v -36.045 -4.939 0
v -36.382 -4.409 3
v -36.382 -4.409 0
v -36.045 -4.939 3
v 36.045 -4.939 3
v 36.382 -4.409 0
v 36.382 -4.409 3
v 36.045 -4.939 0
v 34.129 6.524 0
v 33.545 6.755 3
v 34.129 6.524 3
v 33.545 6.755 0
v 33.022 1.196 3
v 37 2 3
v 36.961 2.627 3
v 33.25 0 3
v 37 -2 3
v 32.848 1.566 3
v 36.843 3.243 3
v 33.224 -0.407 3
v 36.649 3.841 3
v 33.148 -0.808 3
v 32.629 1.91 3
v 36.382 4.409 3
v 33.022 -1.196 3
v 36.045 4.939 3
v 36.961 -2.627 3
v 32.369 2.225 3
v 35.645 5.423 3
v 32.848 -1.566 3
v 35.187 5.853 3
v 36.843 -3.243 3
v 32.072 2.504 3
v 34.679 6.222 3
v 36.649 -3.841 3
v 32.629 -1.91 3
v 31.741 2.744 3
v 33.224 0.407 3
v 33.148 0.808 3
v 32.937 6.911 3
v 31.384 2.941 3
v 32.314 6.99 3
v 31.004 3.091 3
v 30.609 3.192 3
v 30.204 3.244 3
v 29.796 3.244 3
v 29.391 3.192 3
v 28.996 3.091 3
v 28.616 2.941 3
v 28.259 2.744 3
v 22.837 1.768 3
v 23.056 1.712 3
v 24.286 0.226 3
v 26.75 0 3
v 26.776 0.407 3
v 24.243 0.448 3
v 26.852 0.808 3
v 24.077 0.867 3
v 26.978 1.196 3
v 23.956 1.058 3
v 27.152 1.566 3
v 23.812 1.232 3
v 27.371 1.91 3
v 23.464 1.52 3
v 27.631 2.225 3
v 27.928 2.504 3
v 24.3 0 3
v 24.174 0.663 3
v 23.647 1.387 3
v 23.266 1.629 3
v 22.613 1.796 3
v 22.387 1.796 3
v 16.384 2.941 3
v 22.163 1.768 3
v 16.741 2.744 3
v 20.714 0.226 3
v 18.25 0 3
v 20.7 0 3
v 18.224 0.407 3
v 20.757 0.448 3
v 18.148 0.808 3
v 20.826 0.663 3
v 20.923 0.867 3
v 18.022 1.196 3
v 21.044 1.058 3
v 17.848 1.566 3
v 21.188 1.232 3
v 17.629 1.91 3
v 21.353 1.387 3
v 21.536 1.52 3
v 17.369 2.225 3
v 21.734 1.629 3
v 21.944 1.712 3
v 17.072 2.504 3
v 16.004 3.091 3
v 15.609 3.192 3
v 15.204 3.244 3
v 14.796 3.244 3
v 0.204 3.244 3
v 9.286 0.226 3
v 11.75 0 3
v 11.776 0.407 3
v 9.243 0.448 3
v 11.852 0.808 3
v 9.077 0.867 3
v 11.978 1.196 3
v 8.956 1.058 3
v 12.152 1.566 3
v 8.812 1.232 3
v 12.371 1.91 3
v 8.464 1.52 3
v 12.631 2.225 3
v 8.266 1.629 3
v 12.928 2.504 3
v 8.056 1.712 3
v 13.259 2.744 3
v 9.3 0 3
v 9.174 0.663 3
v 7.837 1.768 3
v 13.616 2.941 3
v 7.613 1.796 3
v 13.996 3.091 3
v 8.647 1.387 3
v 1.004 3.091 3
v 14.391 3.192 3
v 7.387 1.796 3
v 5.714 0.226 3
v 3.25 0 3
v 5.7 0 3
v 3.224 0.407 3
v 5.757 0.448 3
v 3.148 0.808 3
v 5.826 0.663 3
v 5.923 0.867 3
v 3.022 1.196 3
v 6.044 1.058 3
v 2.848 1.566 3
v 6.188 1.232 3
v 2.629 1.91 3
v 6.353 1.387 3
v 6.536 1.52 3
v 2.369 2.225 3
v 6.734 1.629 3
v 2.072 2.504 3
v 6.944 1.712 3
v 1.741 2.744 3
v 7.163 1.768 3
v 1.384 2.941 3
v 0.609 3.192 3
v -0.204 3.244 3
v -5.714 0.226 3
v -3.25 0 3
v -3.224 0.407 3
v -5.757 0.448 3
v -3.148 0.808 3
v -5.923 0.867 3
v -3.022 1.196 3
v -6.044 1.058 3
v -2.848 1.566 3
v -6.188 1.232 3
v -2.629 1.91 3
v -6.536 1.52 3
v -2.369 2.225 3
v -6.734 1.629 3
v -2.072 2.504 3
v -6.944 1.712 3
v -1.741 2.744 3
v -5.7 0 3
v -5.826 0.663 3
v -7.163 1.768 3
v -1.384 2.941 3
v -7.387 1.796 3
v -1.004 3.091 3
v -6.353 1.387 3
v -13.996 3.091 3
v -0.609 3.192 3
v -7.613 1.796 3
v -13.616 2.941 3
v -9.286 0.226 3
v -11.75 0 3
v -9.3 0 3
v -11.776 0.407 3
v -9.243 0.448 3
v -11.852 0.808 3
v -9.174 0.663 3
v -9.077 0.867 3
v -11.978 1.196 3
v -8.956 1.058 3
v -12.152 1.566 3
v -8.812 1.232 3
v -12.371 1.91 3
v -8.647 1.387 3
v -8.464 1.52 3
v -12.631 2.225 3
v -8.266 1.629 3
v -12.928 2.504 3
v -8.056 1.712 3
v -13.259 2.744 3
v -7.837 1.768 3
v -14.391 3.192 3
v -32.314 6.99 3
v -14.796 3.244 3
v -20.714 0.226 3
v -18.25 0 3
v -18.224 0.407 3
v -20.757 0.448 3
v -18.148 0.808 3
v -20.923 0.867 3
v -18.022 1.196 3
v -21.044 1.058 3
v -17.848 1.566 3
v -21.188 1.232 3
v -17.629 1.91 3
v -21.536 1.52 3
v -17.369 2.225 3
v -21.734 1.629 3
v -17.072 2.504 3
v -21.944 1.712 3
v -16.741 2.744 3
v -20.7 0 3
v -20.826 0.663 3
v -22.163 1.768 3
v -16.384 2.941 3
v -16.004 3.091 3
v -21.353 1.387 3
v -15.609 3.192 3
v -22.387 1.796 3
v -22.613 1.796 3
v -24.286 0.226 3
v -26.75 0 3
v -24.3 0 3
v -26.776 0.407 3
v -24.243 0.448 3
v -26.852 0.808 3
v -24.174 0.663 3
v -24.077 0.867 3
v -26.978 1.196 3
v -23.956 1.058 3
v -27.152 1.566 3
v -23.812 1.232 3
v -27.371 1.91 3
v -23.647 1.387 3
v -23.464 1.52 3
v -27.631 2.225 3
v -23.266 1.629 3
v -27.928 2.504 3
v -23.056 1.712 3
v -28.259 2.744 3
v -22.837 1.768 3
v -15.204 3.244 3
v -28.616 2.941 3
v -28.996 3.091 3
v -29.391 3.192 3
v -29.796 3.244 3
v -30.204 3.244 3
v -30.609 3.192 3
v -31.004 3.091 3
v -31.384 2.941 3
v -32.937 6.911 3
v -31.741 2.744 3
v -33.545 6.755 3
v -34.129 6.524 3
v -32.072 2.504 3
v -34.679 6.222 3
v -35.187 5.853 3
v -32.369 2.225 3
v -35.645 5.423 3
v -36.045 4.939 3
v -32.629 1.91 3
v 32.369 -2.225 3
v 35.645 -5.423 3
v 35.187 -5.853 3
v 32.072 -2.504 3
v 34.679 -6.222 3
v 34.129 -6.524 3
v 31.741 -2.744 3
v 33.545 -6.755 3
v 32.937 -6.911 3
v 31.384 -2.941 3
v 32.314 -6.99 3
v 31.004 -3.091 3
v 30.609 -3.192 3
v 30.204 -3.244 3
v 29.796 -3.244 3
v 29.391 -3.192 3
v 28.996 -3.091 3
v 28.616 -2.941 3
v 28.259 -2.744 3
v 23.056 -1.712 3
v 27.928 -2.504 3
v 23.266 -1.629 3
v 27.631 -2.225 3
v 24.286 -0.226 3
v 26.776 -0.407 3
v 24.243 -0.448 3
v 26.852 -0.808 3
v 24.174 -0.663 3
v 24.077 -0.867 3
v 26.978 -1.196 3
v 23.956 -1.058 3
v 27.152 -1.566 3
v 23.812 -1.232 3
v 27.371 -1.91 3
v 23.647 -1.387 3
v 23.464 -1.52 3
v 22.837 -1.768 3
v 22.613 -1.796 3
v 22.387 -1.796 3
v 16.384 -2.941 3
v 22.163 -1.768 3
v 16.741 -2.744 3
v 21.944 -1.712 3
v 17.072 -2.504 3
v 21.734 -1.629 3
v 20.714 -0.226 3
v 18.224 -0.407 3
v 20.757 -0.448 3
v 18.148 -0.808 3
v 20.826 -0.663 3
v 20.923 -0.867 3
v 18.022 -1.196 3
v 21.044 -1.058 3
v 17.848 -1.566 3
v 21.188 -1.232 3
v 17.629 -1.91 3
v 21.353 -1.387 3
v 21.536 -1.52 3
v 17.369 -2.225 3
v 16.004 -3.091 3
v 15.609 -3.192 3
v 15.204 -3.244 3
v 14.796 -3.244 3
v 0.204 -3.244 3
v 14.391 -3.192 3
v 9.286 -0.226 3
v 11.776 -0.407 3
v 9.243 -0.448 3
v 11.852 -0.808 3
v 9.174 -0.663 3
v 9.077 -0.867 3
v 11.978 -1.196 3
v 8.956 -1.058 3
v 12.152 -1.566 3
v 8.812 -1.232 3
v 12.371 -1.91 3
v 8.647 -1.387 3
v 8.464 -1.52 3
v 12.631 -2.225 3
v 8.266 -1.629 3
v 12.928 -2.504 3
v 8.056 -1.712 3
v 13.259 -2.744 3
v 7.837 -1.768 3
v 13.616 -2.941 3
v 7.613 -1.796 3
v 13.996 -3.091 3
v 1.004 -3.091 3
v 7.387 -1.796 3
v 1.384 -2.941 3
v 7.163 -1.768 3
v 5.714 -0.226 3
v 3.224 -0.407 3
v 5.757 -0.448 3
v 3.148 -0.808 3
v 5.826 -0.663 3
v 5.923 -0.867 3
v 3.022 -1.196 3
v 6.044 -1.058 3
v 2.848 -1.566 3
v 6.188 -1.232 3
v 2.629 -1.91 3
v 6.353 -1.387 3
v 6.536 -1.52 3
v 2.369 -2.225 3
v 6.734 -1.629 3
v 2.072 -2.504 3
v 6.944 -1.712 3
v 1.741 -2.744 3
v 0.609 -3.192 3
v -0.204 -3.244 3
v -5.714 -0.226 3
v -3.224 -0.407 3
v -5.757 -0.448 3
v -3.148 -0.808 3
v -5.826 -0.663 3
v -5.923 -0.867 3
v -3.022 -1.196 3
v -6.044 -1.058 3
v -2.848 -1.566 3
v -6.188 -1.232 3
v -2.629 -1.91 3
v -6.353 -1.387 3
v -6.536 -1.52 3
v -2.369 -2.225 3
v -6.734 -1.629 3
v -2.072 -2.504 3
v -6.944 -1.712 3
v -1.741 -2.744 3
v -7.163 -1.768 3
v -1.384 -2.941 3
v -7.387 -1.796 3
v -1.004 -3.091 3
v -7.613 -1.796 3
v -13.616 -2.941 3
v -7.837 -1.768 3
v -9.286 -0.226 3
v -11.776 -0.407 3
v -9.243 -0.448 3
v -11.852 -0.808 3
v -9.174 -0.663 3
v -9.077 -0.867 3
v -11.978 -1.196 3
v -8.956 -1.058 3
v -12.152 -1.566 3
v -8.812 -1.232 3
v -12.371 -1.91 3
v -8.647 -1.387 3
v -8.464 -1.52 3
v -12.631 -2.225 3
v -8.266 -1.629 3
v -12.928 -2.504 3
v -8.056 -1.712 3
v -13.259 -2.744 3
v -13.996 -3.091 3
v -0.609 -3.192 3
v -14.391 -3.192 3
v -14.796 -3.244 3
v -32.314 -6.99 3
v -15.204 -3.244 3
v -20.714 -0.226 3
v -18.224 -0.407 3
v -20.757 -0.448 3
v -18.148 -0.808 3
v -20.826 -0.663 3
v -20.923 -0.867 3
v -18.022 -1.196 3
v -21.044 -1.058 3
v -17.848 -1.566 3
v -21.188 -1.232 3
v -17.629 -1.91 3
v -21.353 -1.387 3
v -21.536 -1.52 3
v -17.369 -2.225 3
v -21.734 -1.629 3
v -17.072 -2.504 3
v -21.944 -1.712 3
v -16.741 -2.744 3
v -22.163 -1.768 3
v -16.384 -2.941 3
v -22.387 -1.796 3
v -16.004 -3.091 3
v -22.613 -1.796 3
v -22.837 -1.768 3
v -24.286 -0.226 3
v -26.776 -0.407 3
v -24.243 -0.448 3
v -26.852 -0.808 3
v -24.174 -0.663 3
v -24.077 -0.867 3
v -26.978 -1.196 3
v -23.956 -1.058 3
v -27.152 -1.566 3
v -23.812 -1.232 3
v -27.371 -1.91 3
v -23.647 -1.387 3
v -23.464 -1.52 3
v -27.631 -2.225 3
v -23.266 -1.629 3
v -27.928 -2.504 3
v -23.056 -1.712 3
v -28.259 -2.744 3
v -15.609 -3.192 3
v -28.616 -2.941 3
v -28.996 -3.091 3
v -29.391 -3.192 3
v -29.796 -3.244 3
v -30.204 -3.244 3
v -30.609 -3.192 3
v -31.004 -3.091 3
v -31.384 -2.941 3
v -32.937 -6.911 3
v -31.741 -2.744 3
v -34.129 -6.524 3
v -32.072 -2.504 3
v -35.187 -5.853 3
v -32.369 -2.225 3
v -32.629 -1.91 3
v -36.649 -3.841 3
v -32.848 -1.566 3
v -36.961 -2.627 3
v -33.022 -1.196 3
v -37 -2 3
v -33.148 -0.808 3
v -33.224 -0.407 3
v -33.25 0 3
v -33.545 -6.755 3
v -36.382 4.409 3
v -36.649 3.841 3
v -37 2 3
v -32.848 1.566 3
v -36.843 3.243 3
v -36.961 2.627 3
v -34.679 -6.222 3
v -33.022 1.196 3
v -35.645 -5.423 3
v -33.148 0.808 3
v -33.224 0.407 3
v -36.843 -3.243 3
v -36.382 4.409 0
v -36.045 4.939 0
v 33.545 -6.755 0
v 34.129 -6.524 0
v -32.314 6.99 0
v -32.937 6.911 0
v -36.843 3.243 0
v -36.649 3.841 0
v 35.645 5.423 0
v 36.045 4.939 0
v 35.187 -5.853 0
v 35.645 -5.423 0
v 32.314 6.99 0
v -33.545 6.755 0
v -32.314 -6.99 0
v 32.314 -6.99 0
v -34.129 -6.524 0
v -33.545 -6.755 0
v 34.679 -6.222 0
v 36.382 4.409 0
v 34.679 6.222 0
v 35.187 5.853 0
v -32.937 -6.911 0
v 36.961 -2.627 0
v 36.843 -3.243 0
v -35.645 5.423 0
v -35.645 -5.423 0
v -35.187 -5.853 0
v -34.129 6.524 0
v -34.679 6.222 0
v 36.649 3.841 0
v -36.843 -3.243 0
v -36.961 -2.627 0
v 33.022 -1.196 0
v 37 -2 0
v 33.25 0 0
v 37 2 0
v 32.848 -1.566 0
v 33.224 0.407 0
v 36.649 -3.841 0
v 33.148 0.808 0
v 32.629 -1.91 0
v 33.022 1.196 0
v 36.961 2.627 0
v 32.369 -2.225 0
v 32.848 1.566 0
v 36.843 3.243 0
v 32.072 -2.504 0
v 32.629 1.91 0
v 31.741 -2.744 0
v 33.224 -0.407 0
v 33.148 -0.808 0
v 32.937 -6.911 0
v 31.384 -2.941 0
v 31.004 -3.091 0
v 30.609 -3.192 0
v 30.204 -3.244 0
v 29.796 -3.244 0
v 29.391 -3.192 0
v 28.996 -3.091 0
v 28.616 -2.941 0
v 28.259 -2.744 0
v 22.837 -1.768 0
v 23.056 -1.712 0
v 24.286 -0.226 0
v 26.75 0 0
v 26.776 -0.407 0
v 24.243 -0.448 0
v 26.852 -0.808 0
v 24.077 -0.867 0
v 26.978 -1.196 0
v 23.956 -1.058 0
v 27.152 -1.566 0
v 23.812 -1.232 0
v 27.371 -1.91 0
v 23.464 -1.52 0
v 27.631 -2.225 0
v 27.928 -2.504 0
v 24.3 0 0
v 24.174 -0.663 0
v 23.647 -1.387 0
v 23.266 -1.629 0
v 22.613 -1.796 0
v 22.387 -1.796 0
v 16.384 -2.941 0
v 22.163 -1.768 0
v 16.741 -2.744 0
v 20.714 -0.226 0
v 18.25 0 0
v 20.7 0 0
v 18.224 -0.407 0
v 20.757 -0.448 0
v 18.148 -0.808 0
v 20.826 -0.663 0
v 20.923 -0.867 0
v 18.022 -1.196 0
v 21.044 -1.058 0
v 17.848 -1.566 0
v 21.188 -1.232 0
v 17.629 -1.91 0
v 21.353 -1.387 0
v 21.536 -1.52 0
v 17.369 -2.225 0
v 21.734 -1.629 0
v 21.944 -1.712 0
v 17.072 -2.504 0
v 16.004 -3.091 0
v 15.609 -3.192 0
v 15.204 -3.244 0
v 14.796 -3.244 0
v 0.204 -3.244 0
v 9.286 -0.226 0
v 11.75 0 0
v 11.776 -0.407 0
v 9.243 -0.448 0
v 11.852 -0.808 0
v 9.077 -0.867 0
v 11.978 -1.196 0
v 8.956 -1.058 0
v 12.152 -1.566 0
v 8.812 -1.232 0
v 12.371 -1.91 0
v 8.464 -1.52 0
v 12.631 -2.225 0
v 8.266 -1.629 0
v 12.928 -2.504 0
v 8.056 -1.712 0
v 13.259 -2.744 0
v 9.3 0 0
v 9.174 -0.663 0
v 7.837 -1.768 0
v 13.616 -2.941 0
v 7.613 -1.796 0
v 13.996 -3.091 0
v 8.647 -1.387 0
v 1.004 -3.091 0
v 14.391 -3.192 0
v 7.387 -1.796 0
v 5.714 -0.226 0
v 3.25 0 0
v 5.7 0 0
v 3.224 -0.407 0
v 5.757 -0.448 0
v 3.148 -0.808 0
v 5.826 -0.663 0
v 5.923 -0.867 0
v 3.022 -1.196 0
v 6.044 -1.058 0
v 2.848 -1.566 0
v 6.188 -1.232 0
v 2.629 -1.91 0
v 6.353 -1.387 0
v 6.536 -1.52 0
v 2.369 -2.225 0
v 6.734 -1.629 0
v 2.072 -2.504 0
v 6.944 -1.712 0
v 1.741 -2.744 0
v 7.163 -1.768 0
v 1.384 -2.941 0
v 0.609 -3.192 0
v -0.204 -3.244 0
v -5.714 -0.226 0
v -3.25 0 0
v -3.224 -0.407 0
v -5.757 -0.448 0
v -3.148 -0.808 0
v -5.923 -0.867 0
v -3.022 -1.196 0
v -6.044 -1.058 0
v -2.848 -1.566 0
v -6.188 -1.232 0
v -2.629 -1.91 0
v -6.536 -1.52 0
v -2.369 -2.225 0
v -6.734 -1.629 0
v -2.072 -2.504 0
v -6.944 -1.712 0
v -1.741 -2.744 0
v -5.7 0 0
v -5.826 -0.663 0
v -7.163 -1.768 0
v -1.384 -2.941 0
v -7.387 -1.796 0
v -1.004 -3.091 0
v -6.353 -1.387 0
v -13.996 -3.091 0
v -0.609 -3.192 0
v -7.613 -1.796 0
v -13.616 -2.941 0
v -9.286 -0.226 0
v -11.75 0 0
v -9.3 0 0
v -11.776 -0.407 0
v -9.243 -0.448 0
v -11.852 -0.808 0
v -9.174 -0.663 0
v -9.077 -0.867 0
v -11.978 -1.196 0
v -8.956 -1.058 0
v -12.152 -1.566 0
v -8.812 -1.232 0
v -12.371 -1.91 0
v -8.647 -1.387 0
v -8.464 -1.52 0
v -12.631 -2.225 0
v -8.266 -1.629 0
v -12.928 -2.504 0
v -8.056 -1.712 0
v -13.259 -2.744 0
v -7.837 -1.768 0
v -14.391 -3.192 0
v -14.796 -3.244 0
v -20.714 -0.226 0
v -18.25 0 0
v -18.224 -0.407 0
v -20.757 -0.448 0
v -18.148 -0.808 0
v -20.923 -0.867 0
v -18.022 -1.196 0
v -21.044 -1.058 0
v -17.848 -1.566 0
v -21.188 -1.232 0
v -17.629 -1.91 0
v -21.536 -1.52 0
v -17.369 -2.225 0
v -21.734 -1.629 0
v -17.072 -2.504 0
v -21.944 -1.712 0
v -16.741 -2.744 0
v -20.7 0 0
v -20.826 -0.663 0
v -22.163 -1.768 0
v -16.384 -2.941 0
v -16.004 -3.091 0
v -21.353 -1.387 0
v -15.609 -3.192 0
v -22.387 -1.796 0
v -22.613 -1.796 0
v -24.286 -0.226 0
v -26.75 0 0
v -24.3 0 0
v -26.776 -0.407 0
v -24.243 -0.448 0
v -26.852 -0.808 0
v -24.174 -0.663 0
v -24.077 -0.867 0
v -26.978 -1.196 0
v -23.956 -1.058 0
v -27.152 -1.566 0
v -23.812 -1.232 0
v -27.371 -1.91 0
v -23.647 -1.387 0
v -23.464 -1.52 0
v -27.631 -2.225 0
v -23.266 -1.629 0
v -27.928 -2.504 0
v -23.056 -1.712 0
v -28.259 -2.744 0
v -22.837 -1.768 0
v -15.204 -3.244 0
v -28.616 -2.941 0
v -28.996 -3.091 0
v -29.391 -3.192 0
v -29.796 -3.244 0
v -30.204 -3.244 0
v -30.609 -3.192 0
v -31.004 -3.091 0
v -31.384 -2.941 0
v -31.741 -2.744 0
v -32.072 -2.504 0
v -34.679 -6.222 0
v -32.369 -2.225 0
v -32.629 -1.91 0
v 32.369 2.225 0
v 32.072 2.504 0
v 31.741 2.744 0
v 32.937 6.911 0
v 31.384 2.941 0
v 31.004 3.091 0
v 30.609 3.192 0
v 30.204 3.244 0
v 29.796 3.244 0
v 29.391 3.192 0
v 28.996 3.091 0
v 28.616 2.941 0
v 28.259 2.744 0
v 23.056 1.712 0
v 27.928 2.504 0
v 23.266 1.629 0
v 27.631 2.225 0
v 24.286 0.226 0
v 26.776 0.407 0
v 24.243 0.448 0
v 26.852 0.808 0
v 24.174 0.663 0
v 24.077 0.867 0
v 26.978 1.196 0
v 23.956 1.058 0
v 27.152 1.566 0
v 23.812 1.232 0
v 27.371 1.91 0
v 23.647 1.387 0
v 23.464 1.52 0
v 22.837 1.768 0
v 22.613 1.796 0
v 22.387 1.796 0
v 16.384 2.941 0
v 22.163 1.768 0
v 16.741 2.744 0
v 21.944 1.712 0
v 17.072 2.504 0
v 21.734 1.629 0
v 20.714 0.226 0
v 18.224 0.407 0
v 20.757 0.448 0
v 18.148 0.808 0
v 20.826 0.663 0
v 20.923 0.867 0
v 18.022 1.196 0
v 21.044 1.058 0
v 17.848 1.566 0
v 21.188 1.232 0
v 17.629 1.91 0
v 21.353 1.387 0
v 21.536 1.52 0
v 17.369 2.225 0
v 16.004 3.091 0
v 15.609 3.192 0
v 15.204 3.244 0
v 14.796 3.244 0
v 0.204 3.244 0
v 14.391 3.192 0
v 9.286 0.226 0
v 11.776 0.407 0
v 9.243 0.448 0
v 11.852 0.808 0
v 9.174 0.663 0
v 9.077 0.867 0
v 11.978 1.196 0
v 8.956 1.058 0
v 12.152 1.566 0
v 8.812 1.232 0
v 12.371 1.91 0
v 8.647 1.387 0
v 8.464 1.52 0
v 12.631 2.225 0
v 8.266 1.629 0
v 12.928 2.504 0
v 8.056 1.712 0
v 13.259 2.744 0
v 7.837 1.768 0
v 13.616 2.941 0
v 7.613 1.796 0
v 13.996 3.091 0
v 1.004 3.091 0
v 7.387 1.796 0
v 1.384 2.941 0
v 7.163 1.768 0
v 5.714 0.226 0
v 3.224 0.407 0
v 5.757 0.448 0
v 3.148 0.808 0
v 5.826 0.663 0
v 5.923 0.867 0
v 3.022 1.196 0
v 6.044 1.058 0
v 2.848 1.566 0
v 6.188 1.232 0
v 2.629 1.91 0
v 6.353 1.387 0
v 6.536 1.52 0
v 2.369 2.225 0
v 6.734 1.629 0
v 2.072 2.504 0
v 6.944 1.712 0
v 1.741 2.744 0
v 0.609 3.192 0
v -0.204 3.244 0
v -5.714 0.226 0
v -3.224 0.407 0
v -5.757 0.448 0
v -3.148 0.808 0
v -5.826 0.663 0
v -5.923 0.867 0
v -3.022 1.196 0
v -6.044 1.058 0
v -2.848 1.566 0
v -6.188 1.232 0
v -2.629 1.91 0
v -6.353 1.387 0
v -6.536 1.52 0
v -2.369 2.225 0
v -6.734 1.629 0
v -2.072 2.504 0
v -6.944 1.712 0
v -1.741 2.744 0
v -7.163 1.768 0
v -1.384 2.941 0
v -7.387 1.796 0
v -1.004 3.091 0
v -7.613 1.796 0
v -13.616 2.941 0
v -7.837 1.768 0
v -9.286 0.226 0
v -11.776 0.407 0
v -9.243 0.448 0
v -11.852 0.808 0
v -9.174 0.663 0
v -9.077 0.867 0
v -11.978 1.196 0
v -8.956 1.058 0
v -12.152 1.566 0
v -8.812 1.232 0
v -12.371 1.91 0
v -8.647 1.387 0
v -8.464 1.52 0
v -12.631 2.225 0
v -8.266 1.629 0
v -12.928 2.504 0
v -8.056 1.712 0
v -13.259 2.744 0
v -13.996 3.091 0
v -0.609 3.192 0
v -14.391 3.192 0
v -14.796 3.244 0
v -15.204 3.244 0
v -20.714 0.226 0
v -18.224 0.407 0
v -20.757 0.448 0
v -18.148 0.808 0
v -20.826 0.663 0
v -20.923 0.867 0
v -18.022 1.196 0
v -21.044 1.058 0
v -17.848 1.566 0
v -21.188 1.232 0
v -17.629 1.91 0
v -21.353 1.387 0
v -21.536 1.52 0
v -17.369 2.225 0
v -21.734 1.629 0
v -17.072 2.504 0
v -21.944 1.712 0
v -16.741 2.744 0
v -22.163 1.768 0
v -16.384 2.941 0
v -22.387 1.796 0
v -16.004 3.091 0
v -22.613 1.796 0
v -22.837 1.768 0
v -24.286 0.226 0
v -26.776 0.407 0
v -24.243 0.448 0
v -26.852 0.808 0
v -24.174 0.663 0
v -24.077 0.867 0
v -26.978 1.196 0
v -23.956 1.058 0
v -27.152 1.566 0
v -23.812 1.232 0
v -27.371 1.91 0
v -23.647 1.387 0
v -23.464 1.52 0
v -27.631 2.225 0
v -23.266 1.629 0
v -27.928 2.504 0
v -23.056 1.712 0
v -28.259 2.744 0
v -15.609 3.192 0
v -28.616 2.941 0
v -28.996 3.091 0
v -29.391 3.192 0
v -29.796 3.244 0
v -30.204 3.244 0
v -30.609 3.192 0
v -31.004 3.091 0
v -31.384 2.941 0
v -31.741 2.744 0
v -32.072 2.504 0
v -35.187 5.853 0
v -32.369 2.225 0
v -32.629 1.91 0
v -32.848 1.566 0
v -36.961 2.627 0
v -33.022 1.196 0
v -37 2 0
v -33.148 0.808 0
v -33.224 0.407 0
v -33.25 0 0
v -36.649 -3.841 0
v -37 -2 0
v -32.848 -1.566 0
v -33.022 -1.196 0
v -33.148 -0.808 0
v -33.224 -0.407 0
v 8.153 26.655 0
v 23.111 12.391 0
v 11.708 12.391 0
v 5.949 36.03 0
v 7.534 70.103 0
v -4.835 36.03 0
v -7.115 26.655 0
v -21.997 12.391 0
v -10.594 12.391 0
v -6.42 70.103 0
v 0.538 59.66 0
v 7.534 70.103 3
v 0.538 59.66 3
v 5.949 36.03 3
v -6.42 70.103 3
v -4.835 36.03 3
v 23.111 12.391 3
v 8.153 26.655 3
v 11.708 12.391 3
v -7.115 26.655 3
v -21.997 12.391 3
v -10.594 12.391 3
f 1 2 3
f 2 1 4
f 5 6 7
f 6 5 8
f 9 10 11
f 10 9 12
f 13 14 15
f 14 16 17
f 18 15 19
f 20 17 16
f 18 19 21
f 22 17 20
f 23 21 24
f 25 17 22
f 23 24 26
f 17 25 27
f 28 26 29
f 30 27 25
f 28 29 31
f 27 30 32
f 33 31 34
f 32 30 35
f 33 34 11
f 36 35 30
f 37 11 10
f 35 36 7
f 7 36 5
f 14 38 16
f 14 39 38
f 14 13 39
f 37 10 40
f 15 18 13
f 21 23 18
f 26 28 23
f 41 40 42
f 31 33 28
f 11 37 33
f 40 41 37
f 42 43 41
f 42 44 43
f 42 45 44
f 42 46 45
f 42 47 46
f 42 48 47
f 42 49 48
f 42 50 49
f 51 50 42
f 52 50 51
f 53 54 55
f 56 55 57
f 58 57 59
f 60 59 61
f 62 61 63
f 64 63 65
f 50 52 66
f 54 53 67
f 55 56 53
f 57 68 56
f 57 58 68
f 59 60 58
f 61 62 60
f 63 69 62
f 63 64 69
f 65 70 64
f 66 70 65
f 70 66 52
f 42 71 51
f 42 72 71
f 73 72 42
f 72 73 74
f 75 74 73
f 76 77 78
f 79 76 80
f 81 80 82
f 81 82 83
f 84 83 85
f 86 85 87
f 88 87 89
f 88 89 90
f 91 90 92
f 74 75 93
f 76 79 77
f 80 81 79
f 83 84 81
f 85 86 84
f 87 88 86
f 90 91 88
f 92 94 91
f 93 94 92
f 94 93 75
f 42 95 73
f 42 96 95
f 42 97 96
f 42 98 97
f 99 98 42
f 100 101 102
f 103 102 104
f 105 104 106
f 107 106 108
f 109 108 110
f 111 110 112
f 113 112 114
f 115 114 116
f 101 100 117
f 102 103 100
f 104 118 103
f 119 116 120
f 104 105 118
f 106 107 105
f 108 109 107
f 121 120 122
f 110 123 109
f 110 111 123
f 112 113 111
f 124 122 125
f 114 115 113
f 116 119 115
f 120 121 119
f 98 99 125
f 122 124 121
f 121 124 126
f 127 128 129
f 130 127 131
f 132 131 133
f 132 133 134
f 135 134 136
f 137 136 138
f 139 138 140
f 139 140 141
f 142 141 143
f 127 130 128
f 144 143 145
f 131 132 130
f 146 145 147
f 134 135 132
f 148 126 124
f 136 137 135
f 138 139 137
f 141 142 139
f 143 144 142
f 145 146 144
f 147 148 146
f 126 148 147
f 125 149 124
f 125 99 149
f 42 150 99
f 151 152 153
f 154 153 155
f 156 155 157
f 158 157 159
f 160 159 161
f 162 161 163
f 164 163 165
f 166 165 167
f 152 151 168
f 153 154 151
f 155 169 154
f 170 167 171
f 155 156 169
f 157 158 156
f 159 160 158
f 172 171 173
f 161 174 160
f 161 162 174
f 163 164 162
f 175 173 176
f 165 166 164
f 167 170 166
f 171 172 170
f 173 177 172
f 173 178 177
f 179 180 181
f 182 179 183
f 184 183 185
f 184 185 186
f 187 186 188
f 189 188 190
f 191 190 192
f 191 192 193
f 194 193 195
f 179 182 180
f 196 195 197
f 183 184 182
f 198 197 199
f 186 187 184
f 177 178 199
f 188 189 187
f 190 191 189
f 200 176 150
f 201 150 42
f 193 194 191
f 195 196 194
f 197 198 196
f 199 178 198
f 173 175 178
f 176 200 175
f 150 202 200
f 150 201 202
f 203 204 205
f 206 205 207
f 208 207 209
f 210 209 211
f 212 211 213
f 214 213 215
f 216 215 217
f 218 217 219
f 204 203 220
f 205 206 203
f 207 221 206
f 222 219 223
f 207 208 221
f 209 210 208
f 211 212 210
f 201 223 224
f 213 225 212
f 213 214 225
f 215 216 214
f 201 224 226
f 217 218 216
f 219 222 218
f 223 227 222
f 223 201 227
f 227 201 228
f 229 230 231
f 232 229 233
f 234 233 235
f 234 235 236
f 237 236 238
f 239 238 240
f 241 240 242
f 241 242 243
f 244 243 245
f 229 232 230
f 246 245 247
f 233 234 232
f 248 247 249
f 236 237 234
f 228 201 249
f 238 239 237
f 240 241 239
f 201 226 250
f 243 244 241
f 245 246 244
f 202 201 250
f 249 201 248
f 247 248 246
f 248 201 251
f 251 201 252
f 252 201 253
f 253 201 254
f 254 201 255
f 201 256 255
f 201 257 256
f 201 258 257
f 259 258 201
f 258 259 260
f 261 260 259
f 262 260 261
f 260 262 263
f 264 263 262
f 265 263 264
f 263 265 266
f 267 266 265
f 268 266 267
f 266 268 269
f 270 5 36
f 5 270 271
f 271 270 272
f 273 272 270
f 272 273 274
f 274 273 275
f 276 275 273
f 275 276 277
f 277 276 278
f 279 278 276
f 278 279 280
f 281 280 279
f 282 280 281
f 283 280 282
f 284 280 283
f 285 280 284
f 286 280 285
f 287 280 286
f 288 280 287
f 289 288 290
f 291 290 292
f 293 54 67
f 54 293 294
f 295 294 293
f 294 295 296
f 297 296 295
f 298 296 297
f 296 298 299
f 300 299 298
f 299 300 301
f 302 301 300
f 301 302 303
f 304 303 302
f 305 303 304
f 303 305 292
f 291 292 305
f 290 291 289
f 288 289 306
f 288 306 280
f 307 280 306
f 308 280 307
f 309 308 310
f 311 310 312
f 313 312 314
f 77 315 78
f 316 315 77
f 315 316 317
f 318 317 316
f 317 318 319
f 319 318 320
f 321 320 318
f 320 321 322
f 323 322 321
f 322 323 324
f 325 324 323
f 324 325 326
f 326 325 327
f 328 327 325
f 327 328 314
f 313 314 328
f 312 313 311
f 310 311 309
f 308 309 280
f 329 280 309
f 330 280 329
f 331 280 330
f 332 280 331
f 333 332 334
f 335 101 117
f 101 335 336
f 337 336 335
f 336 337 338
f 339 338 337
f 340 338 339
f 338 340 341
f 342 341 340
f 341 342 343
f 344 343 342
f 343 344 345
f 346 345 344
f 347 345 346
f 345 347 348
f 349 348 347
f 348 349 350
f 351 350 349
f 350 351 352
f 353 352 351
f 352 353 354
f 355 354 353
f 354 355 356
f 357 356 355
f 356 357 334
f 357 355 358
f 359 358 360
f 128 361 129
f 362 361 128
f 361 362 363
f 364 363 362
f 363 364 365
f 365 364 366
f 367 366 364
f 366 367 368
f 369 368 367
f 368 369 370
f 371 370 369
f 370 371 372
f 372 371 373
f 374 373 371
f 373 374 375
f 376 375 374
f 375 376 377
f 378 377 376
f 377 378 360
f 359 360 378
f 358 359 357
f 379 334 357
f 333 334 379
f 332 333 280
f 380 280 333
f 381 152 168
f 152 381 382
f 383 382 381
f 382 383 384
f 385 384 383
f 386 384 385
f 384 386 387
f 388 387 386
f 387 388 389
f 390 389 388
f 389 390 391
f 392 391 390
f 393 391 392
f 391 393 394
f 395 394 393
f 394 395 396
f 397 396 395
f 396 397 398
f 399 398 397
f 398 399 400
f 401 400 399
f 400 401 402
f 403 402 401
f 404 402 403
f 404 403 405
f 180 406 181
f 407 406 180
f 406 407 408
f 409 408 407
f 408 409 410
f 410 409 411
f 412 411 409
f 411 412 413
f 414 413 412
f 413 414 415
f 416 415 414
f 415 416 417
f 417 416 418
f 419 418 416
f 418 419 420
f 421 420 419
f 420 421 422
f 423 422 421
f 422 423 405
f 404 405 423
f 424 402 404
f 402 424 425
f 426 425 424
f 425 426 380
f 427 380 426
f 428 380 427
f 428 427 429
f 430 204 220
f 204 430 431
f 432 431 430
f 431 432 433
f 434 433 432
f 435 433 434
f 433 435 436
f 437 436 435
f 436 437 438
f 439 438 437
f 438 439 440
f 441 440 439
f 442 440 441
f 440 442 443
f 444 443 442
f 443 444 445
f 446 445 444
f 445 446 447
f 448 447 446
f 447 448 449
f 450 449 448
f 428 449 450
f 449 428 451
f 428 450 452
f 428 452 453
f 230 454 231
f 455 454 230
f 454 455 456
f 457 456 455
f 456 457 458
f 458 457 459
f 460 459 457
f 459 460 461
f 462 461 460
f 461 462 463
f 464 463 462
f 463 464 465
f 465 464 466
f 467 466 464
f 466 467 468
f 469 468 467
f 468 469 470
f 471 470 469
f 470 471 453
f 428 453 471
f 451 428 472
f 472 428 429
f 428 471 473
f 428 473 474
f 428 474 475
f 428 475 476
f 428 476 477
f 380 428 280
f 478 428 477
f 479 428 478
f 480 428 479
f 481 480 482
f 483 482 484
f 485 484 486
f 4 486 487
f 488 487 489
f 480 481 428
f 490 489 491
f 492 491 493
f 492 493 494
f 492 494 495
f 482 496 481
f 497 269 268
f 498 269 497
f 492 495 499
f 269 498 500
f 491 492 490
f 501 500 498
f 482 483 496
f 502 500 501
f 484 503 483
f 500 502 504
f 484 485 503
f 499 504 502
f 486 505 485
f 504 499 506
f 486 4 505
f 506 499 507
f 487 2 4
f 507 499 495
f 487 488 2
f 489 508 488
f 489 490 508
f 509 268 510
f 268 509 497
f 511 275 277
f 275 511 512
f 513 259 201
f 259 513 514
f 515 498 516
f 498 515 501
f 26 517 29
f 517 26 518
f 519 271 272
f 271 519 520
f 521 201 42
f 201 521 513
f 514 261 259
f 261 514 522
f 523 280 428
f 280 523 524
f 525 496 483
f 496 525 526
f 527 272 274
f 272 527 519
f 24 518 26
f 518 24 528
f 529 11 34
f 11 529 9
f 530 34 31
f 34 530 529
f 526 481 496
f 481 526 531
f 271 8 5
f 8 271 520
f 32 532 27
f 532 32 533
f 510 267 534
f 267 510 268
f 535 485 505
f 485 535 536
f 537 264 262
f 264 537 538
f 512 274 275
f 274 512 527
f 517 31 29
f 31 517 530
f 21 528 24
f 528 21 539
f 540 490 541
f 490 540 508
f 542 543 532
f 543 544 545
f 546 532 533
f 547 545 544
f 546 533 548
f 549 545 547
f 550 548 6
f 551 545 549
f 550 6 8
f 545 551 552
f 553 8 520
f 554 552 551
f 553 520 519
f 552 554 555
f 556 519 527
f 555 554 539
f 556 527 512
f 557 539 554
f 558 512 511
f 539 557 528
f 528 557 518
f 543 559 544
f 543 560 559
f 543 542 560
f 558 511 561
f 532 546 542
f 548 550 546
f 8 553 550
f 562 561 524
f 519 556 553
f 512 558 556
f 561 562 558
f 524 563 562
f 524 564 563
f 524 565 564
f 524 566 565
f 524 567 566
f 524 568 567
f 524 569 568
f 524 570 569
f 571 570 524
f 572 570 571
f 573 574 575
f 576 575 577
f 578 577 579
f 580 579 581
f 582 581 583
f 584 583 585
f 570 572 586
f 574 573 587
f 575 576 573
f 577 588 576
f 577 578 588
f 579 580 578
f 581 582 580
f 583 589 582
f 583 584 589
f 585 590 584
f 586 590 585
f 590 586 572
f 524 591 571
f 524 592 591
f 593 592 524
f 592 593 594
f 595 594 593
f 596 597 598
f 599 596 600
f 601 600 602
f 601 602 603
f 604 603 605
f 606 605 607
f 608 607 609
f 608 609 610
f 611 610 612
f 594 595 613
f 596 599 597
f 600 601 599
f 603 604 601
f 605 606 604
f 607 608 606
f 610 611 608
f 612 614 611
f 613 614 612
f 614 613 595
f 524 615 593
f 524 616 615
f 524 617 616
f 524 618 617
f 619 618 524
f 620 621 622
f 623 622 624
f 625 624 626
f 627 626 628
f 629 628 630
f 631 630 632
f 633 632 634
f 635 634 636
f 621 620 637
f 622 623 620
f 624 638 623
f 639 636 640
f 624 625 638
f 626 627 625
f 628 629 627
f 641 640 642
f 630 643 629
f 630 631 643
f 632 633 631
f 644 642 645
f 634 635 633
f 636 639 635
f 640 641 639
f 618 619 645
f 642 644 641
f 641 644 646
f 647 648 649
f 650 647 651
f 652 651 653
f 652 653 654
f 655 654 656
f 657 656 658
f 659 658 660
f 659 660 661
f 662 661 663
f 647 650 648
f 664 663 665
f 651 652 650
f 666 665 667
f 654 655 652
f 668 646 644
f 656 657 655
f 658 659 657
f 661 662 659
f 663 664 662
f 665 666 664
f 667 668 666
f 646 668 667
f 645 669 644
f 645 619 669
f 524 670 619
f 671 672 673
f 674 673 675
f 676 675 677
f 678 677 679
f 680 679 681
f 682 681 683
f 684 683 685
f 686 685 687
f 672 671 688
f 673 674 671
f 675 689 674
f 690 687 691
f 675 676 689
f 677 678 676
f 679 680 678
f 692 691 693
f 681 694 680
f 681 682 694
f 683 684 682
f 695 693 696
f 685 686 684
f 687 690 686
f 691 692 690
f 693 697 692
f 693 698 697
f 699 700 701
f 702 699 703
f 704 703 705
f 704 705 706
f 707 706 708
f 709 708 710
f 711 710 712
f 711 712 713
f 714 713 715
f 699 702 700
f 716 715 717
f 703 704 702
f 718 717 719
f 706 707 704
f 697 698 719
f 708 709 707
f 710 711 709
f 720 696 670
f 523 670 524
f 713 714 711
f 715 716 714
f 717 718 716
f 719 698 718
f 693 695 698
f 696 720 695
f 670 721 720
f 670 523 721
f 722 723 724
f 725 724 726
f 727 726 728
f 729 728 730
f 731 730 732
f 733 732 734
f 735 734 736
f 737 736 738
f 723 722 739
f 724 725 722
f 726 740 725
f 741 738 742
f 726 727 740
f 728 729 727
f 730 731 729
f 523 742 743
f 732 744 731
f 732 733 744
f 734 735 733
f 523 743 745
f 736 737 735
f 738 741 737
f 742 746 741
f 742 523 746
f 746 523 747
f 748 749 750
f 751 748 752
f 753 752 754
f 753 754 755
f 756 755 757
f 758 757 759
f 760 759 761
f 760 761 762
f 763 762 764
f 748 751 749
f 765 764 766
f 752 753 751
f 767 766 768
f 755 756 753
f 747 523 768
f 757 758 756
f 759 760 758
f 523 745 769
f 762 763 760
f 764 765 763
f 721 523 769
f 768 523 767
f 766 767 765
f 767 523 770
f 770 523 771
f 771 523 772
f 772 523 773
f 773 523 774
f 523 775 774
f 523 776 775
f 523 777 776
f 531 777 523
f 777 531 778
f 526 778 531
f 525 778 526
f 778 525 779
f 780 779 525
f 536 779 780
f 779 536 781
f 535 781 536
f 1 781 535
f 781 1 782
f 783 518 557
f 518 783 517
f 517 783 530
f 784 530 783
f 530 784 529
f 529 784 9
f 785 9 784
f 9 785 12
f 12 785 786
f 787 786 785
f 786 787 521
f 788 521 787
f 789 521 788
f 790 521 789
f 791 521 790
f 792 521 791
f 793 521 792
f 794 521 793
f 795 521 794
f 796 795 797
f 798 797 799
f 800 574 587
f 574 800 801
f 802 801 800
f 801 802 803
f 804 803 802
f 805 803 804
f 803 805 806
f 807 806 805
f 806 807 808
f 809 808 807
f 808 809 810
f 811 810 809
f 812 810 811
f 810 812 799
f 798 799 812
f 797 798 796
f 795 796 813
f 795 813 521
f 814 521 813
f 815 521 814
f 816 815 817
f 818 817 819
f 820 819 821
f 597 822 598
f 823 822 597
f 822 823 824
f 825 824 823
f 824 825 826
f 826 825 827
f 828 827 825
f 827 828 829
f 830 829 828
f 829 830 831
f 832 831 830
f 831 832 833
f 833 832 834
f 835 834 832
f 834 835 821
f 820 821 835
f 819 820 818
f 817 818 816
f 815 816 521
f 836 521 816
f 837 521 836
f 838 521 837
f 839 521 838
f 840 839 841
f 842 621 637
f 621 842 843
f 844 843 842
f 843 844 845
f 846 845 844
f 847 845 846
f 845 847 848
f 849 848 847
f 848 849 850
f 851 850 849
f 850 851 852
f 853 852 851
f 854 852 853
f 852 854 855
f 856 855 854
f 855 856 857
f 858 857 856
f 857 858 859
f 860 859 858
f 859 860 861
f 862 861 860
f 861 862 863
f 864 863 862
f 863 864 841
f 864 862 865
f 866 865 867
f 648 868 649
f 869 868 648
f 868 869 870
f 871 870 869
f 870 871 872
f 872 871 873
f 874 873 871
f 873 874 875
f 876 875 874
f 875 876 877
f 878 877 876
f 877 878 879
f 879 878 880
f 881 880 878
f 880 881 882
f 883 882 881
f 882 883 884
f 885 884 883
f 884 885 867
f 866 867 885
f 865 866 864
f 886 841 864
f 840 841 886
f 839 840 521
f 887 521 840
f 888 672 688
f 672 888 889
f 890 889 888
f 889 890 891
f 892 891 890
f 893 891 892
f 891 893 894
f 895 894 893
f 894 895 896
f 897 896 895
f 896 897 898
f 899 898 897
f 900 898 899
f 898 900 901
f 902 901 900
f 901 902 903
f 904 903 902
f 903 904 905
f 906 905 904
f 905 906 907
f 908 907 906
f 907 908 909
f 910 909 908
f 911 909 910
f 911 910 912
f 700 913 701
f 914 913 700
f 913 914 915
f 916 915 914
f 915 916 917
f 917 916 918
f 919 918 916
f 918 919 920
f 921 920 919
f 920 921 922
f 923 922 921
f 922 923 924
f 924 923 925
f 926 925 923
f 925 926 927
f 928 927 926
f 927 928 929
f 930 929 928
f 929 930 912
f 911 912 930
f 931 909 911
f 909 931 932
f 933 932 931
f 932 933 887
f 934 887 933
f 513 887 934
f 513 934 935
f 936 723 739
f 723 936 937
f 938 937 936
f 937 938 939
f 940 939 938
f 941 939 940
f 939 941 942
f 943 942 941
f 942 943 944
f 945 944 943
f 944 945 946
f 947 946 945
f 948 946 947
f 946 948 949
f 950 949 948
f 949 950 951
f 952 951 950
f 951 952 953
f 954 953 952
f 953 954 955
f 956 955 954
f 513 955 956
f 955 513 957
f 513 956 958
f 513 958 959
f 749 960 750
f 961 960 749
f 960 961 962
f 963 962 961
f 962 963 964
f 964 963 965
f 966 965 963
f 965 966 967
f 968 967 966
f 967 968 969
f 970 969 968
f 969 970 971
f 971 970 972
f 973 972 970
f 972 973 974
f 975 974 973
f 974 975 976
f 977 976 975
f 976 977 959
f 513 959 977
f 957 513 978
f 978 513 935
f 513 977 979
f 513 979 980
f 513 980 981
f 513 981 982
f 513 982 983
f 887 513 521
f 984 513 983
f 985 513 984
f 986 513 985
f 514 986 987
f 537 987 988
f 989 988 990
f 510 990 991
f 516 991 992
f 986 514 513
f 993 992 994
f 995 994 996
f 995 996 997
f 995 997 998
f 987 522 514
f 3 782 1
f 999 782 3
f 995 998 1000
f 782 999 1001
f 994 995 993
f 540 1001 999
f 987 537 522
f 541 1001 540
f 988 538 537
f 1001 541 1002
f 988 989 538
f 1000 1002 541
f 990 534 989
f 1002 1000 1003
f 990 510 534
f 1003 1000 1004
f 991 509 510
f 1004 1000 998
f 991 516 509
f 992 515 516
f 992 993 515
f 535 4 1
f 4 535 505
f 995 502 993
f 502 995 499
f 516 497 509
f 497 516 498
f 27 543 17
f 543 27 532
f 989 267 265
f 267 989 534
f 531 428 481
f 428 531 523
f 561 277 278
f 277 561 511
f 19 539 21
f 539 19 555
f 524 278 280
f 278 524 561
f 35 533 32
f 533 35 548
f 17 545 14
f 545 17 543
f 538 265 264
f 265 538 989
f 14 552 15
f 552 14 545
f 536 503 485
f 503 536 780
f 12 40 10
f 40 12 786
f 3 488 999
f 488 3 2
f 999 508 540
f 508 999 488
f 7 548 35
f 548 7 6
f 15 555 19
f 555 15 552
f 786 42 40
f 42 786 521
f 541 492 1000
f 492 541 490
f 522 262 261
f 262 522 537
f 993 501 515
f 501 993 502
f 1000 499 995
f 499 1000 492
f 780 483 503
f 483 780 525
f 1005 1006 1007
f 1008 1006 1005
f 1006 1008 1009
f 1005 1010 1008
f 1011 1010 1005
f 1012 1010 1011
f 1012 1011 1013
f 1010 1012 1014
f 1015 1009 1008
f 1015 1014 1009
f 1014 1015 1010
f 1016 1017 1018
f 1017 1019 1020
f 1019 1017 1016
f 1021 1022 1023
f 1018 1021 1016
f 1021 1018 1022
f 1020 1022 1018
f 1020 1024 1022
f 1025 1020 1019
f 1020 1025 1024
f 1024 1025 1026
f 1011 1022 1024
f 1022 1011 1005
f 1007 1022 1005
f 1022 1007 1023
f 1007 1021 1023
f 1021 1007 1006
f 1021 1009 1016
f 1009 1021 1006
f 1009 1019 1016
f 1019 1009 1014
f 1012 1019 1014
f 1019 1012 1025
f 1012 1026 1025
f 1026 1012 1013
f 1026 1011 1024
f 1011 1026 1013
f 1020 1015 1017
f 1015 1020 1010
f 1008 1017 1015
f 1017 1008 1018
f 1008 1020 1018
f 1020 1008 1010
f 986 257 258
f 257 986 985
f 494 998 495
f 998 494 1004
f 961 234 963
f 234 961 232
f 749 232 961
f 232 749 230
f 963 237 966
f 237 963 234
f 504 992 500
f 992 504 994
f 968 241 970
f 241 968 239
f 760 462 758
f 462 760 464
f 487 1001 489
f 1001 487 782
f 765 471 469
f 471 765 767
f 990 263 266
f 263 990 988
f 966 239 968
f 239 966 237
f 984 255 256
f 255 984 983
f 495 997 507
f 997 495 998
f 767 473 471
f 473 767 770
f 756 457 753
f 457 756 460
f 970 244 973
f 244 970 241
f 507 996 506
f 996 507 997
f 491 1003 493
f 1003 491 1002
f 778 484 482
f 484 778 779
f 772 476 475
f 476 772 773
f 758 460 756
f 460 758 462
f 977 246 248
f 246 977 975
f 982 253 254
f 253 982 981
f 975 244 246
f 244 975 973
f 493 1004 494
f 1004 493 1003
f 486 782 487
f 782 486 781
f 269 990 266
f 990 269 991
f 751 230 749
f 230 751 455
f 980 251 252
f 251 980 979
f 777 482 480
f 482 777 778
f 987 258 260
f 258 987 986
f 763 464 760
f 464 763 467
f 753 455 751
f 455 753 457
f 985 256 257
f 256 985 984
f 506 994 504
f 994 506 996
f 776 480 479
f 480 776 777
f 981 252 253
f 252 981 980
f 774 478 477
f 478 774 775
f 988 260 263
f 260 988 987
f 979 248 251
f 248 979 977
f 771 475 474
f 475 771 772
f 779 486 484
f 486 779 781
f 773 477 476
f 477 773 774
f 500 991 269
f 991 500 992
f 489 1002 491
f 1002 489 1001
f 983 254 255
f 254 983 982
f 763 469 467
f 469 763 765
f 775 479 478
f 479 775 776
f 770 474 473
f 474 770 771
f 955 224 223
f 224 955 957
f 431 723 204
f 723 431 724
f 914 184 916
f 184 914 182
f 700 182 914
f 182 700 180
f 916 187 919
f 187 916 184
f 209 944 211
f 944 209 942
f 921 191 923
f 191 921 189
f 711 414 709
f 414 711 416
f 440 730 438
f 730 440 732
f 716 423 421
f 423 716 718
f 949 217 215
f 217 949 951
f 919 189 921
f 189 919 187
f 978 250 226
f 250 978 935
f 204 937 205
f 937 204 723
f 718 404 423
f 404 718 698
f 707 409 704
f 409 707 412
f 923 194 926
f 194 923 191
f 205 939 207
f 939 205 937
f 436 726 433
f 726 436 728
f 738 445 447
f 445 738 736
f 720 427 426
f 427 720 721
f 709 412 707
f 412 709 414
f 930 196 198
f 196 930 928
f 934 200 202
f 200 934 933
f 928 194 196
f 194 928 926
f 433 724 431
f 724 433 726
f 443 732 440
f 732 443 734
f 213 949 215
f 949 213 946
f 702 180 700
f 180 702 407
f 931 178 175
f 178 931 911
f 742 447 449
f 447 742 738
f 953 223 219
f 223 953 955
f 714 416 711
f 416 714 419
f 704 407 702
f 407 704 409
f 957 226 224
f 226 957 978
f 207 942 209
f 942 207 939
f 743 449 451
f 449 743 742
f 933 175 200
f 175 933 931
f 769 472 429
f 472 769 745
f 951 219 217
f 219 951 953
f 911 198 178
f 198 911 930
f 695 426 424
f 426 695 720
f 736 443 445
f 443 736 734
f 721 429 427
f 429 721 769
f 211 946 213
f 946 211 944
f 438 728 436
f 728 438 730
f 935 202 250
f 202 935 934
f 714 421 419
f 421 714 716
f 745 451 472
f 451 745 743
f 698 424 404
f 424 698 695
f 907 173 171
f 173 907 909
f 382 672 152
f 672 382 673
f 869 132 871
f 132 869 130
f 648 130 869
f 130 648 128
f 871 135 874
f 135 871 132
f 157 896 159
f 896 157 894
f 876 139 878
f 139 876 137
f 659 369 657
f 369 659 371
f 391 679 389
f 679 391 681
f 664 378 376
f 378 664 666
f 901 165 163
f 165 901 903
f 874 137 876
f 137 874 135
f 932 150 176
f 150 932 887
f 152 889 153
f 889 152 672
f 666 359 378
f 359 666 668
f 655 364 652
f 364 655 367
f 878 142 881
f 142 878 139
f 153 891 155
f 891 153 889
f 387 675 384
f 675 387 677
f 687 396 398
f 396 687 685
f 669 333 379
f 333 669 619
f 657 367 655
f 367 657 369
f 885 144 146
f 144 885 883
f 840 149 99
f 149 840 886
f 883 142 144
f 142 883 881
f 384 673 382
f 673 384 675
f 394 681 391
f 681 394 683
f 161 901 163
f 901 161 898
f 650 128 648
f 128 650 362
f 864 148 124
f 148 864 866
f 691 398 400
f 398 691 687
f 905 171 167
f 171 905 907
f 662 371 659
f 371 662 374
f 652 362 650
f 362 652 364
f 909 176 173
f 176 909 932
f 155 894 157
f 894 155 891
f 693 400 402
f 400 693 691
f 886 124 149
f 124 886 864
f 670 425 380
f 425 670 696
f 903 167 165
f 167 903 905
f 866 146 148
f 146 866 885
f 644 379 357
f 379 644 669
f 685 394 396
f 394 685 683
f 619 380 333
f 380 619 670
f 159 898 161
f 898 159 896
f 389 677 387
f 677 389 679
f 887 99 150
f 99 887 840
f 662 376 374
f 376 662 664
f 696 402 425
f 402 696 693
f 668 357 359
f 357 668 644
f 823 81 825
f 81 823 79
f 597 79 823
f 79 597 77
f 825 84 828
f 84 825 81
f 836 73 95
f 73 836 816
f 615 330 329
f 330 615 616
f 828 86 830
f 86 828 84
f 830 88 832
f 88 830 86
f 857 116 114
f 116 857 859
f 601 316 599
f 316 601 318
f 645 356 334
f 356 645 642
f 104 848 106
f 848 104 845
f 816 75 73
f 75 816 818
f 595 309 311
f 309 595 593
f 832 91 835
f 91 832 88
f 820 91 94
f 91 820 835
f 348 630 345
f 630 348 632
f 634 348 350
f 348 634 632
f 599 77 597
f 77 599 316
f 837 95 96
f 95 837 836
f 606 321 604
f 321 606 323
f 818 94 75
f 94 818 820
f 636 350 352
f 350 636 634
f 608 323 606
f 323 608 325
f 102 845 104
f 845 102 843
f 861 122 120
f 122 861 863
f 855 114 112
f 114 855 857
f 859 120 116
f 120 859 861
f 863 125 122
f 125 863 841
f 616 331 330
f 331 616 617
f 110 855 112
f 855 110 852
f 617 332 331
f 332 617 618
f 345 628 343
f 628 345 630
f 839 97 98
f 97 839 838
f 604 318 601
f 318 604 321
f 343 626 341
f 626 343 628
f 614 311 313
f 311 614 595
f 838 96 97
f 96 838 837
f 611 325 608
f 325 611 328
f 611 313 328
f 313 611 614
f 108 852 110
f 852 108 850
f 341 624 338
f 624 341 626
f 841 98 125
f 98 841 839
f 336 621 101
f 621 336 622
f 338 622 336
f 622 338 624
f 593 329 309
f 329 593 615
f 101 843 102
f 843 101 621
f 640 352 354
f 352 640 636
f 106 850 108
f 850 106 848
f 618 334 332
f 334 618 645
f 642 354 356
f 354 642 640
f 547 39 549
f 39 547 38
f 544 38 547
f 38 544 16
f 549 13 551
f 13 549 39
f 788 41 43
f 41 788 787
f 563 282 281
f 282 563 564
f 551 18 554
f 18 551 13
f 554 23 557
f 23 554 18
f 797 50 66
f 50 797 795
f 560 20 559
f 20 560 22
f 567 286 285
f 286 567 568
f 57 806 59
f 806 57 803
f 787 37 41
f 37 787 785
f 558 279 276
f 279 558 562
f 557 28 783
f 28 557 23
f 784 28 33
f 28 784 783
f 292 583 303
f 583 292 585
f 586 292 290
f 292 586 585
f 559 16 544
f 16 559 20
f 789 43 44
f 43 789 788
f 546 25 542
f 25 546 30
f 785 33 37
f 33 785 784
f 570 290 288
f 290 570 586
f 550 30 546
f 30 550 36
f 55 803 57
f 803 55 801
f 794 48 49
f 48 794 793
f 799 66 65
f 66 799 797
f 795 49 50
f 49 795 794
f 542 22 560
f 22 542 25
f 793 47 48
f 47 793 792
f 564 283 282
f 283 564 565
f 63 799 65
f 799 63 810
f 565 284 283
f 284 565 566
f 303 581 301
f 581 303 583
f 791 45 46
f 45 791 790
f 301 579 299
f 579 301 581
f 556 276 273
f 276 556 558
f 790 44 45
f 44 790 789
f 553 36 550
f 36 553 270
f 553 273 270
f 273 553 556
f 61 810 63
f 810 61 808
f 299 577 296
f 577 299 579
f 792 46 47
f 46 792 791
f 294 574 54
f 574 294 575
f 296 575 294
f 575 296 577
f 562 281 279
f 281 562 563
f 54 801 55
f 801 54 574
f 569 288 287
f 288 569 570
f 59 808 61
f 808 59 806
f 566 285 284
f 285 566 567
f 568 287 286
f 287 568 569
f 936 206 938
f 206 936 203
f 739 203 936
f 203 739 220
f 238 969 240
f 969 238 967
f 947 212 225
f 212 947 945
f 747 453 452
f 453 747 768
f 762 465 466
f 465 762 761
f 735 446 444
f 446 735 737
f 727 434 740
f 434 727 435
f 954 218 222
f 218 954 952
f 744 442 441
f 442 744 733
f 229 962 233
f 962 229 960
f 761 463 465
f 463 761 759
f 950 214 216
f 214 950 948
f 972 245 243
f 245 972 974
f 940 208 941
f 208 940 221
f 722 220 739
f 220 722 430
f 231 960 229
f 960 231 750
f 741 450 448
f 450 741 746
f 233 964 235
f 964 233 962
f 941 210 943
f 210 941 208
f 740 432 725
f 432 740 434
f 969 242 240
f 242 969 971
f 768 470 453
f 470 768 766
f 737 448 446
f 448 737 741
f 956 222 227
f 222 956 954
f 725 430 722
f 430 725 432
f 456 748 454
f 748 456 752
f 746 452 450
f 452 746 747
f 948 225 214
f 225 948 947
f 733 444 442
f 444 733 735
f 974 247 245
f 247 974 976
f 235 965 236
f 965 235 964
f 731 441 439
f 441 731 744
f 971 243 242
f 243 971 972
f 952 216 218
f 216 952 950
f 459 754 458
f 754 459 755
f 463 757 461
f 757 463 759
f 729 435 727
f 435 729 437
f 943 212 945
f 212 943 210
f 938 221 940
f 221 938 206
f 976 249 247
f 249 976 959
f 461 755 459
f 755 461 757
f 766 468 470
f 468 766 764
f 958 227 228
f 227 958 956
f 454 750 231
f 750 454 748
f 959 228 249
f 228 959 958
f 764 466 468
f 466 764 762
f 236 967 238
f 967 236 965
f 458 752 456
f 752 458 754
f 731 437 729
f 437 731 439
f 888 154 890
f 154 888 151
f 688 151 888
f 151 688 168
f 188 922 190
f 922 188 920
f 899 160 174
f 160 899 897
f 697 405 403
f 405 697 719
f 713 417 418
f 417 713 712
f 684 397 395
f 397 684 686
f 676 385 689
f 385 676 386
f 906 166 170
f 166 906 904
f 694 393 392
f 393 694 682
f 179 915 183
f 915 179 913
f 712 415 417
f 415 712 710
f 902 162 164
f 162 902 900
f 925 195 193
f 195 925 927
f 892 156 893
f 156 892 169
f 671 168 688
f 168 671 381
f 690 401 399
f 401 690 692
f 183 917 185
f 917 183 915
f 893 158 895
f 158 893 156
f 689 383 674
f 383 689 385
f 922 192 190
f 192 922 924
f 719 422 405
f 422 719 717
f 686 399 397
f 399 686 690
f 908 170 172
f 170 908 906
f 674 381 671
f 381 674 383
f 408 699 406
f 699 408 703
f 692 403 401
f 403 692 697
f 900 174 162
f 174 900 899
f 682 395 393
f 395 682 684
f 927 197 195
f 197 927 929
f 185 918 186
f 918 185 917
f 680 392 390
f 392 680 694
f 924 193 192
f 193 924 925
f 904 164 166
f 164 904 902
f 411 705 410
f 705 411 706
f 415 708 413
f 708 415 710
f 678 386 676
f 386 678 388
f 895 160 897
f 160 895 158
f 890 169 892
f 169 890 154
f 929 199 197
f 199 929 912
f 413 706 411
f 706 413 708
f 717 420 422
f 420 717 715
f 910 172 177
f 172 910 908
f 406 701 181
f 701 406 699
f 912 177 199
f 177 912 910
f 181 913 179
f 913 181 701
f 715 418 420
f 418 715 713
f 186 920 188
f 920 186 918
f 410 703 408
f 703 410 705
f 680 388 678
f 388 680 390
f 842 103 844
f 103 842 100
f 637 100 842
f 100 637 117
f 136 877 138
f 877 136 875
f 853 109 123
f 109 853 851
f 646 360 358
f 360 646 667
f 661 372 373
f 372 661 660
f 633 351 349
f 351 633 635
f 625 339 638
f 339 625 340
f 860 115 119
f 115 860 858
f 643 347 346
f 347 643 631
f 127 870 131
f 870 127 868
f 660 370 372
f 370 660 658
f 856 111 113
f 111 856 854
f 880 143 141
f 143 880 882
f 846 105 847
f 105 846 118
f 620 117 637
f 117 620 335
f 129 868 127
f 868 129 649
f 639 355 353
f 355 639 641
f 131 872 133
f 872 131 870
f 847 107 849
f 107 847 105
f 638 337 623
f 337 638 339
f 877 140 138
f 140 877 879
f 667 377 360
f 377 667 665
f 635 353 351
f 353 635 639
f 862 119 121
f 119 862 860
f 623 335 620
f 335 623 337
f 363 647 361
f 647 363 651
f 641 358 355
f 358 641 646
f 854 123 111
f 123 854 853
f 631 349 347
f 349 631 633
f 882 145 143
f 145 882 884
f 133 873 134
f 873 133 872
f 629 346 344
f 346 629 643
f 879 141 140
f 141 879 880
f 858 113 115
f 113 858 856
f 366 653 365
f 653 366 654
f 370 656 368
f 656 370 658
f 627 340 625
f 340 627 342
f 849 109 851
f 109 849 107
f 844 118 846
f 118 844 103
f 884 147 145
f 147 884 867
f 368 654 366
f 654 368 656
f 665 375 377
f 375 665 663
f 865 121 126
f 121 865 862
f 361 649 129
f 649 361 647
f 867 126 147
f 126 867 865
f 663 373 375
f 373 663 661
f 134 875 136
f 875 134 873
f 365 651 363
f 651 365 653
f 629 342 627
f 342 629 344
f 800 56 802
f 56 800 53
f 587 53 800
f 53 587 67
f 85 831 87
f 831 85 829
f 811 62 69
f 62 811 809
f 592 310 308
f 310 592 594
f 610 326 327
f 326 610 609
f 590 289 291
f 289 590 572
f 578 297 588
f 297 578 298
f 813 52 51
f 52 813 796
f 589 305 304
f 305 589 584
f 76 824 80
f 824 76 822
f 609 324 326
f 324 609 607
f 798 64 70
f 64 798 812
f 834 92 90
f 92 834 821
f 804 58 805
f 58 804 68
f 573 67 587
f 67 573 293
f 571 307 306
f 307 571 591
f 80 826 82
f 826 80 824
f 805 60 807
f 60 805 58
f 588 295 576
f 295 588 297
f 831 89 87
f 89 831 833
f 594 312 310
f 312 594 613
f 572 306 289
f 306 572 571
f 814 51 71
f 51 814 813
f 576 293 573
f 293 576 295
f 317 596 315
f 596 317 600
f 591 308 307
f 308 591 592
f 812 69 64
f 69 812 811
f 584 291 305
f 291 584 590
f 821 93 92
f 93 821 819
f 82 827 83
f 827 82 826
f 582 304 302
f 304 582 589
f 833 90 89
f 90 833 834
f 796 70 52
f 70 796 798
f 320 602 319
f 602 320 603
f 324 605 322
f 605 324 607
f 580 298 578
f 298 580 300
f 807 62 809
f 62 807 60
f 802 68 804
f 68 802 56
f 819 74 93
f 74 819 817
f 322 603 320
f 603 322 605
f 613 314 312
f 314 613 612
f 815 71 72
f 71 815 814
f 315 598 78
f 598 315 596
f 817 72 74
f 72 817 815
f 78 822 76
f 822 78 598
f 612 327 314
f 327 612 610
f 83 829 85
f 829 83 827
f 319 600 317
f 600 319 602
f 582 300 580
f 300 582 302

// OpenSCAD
$fn = 50;


difference() {
	union() {
		hull() {
			translate(v = [-32.0000000000, 2.0000000000, 0]) {
				cylinder(h = 3, r = 5);
			}
			translate(v = [32.0000000000, 2.0000000000, 0]) {
				cylinder(h = 3, r = 5);
			}
			translate(v = [-32.0000000000, -2.0000000000, 0]) {
				cylinder(h = 3, r = 5);
			}
			translate(v = [32.0000000000, -2.0000000000, 0]) {
				cylinder(h = 3, r = 5);
			}
		}
		translate(v = [0, 68.7500000000, 0]) {
			linear_extrude(height = 3) {
				text(font = "DejaVu Sans Mono:style=Bold", halign = "center", size = 57.0000000000, text = "A", valign = "top");
			}
		}
	}
	union() {
		translate(v = [-30.0000000000, 0.0000000000, 0]) {
			translate(v = [0, 0, -100]) {
				cylinder(h = 200, r = 3.2500000000);
			}
		}
		translate(v = [-15.0000000000, 0.0000000000, 0]) {
			translate(v = [0, 0, -100]) {
				cylinder(h = 200, r = 3.2500000000);
			}
		}
		translate(v = [0, 0, -100]) {
			cylinder(h = 200, r = 3.2500000000);
		}
		translate(v = [15.0000000000, 0.0000000000, 0]) {
			translate(v = [0, 0, -100]) {
				cylinder(h = 200, r = 3.2500000000);
			}
		}
		translate(v = [30.0000000000, 0.0000000000, 0]) {
			translate(v = [0, 0, -100]) {
				cylinder(h = 200, r = 3.2500000000);
			}
		}
		translate(v = [-30.0000000000, 0.0000000000, 0]) {
			translate(v = [0, 0, -100]) {
				cylinder(h = 200, r = 1.8000000000);
			}
		}
		translate(v = [-22.5000000000, 0.0000000000, 0]) {
			translate(v = [0, 0, -100]) {
				cylinder(h = 200, r = 1.8000000000);
			}
		}
		translate(v = [-15.0000000000, 0.0000000000, 0]) {
			translate(v = [0, 0, -100]) {
				cylinder(h = 200, r = 1.8000000000);
			}
		}
		translate(v = [-7.5000000000, 0.0000000000, 0]) {
			translate(v = [0, 0, -100]) {
				cylinder(h = 200, r = 1.8000000000);
			}
		}
		translate(v = [0, 0, -100]) {
			cylinder(h = 200, r = 1.8000000000);
		}
		translate(v = [7.5000000000, 0.0000000000, 0]) {
			translate(v = [0, 0, -100]) {
				cylinder(h = 200, r = 1.8000000000);
			}
		}
		translate(v = [15.0000000000, 0.0000000000, 0]) {
			translate(v = [0, 0, -100]) {
				cylinder(h = 200, r = 1.8000000000);
			}
		}
		translate(v = [22.5000000000, 0.0000000000, 0]) {
			translate(v = [0, 0, -100]) {
				cylinder(h = 200, r = 1.8000000000);
			}
		}
		translate(v = [30.0000000000, 0.0000000000, 0]) {
			translate(v = [0, 0, -100]) {
				cylinder(h = 200, r = 1.8000000000);
			}
		}
	}
}
